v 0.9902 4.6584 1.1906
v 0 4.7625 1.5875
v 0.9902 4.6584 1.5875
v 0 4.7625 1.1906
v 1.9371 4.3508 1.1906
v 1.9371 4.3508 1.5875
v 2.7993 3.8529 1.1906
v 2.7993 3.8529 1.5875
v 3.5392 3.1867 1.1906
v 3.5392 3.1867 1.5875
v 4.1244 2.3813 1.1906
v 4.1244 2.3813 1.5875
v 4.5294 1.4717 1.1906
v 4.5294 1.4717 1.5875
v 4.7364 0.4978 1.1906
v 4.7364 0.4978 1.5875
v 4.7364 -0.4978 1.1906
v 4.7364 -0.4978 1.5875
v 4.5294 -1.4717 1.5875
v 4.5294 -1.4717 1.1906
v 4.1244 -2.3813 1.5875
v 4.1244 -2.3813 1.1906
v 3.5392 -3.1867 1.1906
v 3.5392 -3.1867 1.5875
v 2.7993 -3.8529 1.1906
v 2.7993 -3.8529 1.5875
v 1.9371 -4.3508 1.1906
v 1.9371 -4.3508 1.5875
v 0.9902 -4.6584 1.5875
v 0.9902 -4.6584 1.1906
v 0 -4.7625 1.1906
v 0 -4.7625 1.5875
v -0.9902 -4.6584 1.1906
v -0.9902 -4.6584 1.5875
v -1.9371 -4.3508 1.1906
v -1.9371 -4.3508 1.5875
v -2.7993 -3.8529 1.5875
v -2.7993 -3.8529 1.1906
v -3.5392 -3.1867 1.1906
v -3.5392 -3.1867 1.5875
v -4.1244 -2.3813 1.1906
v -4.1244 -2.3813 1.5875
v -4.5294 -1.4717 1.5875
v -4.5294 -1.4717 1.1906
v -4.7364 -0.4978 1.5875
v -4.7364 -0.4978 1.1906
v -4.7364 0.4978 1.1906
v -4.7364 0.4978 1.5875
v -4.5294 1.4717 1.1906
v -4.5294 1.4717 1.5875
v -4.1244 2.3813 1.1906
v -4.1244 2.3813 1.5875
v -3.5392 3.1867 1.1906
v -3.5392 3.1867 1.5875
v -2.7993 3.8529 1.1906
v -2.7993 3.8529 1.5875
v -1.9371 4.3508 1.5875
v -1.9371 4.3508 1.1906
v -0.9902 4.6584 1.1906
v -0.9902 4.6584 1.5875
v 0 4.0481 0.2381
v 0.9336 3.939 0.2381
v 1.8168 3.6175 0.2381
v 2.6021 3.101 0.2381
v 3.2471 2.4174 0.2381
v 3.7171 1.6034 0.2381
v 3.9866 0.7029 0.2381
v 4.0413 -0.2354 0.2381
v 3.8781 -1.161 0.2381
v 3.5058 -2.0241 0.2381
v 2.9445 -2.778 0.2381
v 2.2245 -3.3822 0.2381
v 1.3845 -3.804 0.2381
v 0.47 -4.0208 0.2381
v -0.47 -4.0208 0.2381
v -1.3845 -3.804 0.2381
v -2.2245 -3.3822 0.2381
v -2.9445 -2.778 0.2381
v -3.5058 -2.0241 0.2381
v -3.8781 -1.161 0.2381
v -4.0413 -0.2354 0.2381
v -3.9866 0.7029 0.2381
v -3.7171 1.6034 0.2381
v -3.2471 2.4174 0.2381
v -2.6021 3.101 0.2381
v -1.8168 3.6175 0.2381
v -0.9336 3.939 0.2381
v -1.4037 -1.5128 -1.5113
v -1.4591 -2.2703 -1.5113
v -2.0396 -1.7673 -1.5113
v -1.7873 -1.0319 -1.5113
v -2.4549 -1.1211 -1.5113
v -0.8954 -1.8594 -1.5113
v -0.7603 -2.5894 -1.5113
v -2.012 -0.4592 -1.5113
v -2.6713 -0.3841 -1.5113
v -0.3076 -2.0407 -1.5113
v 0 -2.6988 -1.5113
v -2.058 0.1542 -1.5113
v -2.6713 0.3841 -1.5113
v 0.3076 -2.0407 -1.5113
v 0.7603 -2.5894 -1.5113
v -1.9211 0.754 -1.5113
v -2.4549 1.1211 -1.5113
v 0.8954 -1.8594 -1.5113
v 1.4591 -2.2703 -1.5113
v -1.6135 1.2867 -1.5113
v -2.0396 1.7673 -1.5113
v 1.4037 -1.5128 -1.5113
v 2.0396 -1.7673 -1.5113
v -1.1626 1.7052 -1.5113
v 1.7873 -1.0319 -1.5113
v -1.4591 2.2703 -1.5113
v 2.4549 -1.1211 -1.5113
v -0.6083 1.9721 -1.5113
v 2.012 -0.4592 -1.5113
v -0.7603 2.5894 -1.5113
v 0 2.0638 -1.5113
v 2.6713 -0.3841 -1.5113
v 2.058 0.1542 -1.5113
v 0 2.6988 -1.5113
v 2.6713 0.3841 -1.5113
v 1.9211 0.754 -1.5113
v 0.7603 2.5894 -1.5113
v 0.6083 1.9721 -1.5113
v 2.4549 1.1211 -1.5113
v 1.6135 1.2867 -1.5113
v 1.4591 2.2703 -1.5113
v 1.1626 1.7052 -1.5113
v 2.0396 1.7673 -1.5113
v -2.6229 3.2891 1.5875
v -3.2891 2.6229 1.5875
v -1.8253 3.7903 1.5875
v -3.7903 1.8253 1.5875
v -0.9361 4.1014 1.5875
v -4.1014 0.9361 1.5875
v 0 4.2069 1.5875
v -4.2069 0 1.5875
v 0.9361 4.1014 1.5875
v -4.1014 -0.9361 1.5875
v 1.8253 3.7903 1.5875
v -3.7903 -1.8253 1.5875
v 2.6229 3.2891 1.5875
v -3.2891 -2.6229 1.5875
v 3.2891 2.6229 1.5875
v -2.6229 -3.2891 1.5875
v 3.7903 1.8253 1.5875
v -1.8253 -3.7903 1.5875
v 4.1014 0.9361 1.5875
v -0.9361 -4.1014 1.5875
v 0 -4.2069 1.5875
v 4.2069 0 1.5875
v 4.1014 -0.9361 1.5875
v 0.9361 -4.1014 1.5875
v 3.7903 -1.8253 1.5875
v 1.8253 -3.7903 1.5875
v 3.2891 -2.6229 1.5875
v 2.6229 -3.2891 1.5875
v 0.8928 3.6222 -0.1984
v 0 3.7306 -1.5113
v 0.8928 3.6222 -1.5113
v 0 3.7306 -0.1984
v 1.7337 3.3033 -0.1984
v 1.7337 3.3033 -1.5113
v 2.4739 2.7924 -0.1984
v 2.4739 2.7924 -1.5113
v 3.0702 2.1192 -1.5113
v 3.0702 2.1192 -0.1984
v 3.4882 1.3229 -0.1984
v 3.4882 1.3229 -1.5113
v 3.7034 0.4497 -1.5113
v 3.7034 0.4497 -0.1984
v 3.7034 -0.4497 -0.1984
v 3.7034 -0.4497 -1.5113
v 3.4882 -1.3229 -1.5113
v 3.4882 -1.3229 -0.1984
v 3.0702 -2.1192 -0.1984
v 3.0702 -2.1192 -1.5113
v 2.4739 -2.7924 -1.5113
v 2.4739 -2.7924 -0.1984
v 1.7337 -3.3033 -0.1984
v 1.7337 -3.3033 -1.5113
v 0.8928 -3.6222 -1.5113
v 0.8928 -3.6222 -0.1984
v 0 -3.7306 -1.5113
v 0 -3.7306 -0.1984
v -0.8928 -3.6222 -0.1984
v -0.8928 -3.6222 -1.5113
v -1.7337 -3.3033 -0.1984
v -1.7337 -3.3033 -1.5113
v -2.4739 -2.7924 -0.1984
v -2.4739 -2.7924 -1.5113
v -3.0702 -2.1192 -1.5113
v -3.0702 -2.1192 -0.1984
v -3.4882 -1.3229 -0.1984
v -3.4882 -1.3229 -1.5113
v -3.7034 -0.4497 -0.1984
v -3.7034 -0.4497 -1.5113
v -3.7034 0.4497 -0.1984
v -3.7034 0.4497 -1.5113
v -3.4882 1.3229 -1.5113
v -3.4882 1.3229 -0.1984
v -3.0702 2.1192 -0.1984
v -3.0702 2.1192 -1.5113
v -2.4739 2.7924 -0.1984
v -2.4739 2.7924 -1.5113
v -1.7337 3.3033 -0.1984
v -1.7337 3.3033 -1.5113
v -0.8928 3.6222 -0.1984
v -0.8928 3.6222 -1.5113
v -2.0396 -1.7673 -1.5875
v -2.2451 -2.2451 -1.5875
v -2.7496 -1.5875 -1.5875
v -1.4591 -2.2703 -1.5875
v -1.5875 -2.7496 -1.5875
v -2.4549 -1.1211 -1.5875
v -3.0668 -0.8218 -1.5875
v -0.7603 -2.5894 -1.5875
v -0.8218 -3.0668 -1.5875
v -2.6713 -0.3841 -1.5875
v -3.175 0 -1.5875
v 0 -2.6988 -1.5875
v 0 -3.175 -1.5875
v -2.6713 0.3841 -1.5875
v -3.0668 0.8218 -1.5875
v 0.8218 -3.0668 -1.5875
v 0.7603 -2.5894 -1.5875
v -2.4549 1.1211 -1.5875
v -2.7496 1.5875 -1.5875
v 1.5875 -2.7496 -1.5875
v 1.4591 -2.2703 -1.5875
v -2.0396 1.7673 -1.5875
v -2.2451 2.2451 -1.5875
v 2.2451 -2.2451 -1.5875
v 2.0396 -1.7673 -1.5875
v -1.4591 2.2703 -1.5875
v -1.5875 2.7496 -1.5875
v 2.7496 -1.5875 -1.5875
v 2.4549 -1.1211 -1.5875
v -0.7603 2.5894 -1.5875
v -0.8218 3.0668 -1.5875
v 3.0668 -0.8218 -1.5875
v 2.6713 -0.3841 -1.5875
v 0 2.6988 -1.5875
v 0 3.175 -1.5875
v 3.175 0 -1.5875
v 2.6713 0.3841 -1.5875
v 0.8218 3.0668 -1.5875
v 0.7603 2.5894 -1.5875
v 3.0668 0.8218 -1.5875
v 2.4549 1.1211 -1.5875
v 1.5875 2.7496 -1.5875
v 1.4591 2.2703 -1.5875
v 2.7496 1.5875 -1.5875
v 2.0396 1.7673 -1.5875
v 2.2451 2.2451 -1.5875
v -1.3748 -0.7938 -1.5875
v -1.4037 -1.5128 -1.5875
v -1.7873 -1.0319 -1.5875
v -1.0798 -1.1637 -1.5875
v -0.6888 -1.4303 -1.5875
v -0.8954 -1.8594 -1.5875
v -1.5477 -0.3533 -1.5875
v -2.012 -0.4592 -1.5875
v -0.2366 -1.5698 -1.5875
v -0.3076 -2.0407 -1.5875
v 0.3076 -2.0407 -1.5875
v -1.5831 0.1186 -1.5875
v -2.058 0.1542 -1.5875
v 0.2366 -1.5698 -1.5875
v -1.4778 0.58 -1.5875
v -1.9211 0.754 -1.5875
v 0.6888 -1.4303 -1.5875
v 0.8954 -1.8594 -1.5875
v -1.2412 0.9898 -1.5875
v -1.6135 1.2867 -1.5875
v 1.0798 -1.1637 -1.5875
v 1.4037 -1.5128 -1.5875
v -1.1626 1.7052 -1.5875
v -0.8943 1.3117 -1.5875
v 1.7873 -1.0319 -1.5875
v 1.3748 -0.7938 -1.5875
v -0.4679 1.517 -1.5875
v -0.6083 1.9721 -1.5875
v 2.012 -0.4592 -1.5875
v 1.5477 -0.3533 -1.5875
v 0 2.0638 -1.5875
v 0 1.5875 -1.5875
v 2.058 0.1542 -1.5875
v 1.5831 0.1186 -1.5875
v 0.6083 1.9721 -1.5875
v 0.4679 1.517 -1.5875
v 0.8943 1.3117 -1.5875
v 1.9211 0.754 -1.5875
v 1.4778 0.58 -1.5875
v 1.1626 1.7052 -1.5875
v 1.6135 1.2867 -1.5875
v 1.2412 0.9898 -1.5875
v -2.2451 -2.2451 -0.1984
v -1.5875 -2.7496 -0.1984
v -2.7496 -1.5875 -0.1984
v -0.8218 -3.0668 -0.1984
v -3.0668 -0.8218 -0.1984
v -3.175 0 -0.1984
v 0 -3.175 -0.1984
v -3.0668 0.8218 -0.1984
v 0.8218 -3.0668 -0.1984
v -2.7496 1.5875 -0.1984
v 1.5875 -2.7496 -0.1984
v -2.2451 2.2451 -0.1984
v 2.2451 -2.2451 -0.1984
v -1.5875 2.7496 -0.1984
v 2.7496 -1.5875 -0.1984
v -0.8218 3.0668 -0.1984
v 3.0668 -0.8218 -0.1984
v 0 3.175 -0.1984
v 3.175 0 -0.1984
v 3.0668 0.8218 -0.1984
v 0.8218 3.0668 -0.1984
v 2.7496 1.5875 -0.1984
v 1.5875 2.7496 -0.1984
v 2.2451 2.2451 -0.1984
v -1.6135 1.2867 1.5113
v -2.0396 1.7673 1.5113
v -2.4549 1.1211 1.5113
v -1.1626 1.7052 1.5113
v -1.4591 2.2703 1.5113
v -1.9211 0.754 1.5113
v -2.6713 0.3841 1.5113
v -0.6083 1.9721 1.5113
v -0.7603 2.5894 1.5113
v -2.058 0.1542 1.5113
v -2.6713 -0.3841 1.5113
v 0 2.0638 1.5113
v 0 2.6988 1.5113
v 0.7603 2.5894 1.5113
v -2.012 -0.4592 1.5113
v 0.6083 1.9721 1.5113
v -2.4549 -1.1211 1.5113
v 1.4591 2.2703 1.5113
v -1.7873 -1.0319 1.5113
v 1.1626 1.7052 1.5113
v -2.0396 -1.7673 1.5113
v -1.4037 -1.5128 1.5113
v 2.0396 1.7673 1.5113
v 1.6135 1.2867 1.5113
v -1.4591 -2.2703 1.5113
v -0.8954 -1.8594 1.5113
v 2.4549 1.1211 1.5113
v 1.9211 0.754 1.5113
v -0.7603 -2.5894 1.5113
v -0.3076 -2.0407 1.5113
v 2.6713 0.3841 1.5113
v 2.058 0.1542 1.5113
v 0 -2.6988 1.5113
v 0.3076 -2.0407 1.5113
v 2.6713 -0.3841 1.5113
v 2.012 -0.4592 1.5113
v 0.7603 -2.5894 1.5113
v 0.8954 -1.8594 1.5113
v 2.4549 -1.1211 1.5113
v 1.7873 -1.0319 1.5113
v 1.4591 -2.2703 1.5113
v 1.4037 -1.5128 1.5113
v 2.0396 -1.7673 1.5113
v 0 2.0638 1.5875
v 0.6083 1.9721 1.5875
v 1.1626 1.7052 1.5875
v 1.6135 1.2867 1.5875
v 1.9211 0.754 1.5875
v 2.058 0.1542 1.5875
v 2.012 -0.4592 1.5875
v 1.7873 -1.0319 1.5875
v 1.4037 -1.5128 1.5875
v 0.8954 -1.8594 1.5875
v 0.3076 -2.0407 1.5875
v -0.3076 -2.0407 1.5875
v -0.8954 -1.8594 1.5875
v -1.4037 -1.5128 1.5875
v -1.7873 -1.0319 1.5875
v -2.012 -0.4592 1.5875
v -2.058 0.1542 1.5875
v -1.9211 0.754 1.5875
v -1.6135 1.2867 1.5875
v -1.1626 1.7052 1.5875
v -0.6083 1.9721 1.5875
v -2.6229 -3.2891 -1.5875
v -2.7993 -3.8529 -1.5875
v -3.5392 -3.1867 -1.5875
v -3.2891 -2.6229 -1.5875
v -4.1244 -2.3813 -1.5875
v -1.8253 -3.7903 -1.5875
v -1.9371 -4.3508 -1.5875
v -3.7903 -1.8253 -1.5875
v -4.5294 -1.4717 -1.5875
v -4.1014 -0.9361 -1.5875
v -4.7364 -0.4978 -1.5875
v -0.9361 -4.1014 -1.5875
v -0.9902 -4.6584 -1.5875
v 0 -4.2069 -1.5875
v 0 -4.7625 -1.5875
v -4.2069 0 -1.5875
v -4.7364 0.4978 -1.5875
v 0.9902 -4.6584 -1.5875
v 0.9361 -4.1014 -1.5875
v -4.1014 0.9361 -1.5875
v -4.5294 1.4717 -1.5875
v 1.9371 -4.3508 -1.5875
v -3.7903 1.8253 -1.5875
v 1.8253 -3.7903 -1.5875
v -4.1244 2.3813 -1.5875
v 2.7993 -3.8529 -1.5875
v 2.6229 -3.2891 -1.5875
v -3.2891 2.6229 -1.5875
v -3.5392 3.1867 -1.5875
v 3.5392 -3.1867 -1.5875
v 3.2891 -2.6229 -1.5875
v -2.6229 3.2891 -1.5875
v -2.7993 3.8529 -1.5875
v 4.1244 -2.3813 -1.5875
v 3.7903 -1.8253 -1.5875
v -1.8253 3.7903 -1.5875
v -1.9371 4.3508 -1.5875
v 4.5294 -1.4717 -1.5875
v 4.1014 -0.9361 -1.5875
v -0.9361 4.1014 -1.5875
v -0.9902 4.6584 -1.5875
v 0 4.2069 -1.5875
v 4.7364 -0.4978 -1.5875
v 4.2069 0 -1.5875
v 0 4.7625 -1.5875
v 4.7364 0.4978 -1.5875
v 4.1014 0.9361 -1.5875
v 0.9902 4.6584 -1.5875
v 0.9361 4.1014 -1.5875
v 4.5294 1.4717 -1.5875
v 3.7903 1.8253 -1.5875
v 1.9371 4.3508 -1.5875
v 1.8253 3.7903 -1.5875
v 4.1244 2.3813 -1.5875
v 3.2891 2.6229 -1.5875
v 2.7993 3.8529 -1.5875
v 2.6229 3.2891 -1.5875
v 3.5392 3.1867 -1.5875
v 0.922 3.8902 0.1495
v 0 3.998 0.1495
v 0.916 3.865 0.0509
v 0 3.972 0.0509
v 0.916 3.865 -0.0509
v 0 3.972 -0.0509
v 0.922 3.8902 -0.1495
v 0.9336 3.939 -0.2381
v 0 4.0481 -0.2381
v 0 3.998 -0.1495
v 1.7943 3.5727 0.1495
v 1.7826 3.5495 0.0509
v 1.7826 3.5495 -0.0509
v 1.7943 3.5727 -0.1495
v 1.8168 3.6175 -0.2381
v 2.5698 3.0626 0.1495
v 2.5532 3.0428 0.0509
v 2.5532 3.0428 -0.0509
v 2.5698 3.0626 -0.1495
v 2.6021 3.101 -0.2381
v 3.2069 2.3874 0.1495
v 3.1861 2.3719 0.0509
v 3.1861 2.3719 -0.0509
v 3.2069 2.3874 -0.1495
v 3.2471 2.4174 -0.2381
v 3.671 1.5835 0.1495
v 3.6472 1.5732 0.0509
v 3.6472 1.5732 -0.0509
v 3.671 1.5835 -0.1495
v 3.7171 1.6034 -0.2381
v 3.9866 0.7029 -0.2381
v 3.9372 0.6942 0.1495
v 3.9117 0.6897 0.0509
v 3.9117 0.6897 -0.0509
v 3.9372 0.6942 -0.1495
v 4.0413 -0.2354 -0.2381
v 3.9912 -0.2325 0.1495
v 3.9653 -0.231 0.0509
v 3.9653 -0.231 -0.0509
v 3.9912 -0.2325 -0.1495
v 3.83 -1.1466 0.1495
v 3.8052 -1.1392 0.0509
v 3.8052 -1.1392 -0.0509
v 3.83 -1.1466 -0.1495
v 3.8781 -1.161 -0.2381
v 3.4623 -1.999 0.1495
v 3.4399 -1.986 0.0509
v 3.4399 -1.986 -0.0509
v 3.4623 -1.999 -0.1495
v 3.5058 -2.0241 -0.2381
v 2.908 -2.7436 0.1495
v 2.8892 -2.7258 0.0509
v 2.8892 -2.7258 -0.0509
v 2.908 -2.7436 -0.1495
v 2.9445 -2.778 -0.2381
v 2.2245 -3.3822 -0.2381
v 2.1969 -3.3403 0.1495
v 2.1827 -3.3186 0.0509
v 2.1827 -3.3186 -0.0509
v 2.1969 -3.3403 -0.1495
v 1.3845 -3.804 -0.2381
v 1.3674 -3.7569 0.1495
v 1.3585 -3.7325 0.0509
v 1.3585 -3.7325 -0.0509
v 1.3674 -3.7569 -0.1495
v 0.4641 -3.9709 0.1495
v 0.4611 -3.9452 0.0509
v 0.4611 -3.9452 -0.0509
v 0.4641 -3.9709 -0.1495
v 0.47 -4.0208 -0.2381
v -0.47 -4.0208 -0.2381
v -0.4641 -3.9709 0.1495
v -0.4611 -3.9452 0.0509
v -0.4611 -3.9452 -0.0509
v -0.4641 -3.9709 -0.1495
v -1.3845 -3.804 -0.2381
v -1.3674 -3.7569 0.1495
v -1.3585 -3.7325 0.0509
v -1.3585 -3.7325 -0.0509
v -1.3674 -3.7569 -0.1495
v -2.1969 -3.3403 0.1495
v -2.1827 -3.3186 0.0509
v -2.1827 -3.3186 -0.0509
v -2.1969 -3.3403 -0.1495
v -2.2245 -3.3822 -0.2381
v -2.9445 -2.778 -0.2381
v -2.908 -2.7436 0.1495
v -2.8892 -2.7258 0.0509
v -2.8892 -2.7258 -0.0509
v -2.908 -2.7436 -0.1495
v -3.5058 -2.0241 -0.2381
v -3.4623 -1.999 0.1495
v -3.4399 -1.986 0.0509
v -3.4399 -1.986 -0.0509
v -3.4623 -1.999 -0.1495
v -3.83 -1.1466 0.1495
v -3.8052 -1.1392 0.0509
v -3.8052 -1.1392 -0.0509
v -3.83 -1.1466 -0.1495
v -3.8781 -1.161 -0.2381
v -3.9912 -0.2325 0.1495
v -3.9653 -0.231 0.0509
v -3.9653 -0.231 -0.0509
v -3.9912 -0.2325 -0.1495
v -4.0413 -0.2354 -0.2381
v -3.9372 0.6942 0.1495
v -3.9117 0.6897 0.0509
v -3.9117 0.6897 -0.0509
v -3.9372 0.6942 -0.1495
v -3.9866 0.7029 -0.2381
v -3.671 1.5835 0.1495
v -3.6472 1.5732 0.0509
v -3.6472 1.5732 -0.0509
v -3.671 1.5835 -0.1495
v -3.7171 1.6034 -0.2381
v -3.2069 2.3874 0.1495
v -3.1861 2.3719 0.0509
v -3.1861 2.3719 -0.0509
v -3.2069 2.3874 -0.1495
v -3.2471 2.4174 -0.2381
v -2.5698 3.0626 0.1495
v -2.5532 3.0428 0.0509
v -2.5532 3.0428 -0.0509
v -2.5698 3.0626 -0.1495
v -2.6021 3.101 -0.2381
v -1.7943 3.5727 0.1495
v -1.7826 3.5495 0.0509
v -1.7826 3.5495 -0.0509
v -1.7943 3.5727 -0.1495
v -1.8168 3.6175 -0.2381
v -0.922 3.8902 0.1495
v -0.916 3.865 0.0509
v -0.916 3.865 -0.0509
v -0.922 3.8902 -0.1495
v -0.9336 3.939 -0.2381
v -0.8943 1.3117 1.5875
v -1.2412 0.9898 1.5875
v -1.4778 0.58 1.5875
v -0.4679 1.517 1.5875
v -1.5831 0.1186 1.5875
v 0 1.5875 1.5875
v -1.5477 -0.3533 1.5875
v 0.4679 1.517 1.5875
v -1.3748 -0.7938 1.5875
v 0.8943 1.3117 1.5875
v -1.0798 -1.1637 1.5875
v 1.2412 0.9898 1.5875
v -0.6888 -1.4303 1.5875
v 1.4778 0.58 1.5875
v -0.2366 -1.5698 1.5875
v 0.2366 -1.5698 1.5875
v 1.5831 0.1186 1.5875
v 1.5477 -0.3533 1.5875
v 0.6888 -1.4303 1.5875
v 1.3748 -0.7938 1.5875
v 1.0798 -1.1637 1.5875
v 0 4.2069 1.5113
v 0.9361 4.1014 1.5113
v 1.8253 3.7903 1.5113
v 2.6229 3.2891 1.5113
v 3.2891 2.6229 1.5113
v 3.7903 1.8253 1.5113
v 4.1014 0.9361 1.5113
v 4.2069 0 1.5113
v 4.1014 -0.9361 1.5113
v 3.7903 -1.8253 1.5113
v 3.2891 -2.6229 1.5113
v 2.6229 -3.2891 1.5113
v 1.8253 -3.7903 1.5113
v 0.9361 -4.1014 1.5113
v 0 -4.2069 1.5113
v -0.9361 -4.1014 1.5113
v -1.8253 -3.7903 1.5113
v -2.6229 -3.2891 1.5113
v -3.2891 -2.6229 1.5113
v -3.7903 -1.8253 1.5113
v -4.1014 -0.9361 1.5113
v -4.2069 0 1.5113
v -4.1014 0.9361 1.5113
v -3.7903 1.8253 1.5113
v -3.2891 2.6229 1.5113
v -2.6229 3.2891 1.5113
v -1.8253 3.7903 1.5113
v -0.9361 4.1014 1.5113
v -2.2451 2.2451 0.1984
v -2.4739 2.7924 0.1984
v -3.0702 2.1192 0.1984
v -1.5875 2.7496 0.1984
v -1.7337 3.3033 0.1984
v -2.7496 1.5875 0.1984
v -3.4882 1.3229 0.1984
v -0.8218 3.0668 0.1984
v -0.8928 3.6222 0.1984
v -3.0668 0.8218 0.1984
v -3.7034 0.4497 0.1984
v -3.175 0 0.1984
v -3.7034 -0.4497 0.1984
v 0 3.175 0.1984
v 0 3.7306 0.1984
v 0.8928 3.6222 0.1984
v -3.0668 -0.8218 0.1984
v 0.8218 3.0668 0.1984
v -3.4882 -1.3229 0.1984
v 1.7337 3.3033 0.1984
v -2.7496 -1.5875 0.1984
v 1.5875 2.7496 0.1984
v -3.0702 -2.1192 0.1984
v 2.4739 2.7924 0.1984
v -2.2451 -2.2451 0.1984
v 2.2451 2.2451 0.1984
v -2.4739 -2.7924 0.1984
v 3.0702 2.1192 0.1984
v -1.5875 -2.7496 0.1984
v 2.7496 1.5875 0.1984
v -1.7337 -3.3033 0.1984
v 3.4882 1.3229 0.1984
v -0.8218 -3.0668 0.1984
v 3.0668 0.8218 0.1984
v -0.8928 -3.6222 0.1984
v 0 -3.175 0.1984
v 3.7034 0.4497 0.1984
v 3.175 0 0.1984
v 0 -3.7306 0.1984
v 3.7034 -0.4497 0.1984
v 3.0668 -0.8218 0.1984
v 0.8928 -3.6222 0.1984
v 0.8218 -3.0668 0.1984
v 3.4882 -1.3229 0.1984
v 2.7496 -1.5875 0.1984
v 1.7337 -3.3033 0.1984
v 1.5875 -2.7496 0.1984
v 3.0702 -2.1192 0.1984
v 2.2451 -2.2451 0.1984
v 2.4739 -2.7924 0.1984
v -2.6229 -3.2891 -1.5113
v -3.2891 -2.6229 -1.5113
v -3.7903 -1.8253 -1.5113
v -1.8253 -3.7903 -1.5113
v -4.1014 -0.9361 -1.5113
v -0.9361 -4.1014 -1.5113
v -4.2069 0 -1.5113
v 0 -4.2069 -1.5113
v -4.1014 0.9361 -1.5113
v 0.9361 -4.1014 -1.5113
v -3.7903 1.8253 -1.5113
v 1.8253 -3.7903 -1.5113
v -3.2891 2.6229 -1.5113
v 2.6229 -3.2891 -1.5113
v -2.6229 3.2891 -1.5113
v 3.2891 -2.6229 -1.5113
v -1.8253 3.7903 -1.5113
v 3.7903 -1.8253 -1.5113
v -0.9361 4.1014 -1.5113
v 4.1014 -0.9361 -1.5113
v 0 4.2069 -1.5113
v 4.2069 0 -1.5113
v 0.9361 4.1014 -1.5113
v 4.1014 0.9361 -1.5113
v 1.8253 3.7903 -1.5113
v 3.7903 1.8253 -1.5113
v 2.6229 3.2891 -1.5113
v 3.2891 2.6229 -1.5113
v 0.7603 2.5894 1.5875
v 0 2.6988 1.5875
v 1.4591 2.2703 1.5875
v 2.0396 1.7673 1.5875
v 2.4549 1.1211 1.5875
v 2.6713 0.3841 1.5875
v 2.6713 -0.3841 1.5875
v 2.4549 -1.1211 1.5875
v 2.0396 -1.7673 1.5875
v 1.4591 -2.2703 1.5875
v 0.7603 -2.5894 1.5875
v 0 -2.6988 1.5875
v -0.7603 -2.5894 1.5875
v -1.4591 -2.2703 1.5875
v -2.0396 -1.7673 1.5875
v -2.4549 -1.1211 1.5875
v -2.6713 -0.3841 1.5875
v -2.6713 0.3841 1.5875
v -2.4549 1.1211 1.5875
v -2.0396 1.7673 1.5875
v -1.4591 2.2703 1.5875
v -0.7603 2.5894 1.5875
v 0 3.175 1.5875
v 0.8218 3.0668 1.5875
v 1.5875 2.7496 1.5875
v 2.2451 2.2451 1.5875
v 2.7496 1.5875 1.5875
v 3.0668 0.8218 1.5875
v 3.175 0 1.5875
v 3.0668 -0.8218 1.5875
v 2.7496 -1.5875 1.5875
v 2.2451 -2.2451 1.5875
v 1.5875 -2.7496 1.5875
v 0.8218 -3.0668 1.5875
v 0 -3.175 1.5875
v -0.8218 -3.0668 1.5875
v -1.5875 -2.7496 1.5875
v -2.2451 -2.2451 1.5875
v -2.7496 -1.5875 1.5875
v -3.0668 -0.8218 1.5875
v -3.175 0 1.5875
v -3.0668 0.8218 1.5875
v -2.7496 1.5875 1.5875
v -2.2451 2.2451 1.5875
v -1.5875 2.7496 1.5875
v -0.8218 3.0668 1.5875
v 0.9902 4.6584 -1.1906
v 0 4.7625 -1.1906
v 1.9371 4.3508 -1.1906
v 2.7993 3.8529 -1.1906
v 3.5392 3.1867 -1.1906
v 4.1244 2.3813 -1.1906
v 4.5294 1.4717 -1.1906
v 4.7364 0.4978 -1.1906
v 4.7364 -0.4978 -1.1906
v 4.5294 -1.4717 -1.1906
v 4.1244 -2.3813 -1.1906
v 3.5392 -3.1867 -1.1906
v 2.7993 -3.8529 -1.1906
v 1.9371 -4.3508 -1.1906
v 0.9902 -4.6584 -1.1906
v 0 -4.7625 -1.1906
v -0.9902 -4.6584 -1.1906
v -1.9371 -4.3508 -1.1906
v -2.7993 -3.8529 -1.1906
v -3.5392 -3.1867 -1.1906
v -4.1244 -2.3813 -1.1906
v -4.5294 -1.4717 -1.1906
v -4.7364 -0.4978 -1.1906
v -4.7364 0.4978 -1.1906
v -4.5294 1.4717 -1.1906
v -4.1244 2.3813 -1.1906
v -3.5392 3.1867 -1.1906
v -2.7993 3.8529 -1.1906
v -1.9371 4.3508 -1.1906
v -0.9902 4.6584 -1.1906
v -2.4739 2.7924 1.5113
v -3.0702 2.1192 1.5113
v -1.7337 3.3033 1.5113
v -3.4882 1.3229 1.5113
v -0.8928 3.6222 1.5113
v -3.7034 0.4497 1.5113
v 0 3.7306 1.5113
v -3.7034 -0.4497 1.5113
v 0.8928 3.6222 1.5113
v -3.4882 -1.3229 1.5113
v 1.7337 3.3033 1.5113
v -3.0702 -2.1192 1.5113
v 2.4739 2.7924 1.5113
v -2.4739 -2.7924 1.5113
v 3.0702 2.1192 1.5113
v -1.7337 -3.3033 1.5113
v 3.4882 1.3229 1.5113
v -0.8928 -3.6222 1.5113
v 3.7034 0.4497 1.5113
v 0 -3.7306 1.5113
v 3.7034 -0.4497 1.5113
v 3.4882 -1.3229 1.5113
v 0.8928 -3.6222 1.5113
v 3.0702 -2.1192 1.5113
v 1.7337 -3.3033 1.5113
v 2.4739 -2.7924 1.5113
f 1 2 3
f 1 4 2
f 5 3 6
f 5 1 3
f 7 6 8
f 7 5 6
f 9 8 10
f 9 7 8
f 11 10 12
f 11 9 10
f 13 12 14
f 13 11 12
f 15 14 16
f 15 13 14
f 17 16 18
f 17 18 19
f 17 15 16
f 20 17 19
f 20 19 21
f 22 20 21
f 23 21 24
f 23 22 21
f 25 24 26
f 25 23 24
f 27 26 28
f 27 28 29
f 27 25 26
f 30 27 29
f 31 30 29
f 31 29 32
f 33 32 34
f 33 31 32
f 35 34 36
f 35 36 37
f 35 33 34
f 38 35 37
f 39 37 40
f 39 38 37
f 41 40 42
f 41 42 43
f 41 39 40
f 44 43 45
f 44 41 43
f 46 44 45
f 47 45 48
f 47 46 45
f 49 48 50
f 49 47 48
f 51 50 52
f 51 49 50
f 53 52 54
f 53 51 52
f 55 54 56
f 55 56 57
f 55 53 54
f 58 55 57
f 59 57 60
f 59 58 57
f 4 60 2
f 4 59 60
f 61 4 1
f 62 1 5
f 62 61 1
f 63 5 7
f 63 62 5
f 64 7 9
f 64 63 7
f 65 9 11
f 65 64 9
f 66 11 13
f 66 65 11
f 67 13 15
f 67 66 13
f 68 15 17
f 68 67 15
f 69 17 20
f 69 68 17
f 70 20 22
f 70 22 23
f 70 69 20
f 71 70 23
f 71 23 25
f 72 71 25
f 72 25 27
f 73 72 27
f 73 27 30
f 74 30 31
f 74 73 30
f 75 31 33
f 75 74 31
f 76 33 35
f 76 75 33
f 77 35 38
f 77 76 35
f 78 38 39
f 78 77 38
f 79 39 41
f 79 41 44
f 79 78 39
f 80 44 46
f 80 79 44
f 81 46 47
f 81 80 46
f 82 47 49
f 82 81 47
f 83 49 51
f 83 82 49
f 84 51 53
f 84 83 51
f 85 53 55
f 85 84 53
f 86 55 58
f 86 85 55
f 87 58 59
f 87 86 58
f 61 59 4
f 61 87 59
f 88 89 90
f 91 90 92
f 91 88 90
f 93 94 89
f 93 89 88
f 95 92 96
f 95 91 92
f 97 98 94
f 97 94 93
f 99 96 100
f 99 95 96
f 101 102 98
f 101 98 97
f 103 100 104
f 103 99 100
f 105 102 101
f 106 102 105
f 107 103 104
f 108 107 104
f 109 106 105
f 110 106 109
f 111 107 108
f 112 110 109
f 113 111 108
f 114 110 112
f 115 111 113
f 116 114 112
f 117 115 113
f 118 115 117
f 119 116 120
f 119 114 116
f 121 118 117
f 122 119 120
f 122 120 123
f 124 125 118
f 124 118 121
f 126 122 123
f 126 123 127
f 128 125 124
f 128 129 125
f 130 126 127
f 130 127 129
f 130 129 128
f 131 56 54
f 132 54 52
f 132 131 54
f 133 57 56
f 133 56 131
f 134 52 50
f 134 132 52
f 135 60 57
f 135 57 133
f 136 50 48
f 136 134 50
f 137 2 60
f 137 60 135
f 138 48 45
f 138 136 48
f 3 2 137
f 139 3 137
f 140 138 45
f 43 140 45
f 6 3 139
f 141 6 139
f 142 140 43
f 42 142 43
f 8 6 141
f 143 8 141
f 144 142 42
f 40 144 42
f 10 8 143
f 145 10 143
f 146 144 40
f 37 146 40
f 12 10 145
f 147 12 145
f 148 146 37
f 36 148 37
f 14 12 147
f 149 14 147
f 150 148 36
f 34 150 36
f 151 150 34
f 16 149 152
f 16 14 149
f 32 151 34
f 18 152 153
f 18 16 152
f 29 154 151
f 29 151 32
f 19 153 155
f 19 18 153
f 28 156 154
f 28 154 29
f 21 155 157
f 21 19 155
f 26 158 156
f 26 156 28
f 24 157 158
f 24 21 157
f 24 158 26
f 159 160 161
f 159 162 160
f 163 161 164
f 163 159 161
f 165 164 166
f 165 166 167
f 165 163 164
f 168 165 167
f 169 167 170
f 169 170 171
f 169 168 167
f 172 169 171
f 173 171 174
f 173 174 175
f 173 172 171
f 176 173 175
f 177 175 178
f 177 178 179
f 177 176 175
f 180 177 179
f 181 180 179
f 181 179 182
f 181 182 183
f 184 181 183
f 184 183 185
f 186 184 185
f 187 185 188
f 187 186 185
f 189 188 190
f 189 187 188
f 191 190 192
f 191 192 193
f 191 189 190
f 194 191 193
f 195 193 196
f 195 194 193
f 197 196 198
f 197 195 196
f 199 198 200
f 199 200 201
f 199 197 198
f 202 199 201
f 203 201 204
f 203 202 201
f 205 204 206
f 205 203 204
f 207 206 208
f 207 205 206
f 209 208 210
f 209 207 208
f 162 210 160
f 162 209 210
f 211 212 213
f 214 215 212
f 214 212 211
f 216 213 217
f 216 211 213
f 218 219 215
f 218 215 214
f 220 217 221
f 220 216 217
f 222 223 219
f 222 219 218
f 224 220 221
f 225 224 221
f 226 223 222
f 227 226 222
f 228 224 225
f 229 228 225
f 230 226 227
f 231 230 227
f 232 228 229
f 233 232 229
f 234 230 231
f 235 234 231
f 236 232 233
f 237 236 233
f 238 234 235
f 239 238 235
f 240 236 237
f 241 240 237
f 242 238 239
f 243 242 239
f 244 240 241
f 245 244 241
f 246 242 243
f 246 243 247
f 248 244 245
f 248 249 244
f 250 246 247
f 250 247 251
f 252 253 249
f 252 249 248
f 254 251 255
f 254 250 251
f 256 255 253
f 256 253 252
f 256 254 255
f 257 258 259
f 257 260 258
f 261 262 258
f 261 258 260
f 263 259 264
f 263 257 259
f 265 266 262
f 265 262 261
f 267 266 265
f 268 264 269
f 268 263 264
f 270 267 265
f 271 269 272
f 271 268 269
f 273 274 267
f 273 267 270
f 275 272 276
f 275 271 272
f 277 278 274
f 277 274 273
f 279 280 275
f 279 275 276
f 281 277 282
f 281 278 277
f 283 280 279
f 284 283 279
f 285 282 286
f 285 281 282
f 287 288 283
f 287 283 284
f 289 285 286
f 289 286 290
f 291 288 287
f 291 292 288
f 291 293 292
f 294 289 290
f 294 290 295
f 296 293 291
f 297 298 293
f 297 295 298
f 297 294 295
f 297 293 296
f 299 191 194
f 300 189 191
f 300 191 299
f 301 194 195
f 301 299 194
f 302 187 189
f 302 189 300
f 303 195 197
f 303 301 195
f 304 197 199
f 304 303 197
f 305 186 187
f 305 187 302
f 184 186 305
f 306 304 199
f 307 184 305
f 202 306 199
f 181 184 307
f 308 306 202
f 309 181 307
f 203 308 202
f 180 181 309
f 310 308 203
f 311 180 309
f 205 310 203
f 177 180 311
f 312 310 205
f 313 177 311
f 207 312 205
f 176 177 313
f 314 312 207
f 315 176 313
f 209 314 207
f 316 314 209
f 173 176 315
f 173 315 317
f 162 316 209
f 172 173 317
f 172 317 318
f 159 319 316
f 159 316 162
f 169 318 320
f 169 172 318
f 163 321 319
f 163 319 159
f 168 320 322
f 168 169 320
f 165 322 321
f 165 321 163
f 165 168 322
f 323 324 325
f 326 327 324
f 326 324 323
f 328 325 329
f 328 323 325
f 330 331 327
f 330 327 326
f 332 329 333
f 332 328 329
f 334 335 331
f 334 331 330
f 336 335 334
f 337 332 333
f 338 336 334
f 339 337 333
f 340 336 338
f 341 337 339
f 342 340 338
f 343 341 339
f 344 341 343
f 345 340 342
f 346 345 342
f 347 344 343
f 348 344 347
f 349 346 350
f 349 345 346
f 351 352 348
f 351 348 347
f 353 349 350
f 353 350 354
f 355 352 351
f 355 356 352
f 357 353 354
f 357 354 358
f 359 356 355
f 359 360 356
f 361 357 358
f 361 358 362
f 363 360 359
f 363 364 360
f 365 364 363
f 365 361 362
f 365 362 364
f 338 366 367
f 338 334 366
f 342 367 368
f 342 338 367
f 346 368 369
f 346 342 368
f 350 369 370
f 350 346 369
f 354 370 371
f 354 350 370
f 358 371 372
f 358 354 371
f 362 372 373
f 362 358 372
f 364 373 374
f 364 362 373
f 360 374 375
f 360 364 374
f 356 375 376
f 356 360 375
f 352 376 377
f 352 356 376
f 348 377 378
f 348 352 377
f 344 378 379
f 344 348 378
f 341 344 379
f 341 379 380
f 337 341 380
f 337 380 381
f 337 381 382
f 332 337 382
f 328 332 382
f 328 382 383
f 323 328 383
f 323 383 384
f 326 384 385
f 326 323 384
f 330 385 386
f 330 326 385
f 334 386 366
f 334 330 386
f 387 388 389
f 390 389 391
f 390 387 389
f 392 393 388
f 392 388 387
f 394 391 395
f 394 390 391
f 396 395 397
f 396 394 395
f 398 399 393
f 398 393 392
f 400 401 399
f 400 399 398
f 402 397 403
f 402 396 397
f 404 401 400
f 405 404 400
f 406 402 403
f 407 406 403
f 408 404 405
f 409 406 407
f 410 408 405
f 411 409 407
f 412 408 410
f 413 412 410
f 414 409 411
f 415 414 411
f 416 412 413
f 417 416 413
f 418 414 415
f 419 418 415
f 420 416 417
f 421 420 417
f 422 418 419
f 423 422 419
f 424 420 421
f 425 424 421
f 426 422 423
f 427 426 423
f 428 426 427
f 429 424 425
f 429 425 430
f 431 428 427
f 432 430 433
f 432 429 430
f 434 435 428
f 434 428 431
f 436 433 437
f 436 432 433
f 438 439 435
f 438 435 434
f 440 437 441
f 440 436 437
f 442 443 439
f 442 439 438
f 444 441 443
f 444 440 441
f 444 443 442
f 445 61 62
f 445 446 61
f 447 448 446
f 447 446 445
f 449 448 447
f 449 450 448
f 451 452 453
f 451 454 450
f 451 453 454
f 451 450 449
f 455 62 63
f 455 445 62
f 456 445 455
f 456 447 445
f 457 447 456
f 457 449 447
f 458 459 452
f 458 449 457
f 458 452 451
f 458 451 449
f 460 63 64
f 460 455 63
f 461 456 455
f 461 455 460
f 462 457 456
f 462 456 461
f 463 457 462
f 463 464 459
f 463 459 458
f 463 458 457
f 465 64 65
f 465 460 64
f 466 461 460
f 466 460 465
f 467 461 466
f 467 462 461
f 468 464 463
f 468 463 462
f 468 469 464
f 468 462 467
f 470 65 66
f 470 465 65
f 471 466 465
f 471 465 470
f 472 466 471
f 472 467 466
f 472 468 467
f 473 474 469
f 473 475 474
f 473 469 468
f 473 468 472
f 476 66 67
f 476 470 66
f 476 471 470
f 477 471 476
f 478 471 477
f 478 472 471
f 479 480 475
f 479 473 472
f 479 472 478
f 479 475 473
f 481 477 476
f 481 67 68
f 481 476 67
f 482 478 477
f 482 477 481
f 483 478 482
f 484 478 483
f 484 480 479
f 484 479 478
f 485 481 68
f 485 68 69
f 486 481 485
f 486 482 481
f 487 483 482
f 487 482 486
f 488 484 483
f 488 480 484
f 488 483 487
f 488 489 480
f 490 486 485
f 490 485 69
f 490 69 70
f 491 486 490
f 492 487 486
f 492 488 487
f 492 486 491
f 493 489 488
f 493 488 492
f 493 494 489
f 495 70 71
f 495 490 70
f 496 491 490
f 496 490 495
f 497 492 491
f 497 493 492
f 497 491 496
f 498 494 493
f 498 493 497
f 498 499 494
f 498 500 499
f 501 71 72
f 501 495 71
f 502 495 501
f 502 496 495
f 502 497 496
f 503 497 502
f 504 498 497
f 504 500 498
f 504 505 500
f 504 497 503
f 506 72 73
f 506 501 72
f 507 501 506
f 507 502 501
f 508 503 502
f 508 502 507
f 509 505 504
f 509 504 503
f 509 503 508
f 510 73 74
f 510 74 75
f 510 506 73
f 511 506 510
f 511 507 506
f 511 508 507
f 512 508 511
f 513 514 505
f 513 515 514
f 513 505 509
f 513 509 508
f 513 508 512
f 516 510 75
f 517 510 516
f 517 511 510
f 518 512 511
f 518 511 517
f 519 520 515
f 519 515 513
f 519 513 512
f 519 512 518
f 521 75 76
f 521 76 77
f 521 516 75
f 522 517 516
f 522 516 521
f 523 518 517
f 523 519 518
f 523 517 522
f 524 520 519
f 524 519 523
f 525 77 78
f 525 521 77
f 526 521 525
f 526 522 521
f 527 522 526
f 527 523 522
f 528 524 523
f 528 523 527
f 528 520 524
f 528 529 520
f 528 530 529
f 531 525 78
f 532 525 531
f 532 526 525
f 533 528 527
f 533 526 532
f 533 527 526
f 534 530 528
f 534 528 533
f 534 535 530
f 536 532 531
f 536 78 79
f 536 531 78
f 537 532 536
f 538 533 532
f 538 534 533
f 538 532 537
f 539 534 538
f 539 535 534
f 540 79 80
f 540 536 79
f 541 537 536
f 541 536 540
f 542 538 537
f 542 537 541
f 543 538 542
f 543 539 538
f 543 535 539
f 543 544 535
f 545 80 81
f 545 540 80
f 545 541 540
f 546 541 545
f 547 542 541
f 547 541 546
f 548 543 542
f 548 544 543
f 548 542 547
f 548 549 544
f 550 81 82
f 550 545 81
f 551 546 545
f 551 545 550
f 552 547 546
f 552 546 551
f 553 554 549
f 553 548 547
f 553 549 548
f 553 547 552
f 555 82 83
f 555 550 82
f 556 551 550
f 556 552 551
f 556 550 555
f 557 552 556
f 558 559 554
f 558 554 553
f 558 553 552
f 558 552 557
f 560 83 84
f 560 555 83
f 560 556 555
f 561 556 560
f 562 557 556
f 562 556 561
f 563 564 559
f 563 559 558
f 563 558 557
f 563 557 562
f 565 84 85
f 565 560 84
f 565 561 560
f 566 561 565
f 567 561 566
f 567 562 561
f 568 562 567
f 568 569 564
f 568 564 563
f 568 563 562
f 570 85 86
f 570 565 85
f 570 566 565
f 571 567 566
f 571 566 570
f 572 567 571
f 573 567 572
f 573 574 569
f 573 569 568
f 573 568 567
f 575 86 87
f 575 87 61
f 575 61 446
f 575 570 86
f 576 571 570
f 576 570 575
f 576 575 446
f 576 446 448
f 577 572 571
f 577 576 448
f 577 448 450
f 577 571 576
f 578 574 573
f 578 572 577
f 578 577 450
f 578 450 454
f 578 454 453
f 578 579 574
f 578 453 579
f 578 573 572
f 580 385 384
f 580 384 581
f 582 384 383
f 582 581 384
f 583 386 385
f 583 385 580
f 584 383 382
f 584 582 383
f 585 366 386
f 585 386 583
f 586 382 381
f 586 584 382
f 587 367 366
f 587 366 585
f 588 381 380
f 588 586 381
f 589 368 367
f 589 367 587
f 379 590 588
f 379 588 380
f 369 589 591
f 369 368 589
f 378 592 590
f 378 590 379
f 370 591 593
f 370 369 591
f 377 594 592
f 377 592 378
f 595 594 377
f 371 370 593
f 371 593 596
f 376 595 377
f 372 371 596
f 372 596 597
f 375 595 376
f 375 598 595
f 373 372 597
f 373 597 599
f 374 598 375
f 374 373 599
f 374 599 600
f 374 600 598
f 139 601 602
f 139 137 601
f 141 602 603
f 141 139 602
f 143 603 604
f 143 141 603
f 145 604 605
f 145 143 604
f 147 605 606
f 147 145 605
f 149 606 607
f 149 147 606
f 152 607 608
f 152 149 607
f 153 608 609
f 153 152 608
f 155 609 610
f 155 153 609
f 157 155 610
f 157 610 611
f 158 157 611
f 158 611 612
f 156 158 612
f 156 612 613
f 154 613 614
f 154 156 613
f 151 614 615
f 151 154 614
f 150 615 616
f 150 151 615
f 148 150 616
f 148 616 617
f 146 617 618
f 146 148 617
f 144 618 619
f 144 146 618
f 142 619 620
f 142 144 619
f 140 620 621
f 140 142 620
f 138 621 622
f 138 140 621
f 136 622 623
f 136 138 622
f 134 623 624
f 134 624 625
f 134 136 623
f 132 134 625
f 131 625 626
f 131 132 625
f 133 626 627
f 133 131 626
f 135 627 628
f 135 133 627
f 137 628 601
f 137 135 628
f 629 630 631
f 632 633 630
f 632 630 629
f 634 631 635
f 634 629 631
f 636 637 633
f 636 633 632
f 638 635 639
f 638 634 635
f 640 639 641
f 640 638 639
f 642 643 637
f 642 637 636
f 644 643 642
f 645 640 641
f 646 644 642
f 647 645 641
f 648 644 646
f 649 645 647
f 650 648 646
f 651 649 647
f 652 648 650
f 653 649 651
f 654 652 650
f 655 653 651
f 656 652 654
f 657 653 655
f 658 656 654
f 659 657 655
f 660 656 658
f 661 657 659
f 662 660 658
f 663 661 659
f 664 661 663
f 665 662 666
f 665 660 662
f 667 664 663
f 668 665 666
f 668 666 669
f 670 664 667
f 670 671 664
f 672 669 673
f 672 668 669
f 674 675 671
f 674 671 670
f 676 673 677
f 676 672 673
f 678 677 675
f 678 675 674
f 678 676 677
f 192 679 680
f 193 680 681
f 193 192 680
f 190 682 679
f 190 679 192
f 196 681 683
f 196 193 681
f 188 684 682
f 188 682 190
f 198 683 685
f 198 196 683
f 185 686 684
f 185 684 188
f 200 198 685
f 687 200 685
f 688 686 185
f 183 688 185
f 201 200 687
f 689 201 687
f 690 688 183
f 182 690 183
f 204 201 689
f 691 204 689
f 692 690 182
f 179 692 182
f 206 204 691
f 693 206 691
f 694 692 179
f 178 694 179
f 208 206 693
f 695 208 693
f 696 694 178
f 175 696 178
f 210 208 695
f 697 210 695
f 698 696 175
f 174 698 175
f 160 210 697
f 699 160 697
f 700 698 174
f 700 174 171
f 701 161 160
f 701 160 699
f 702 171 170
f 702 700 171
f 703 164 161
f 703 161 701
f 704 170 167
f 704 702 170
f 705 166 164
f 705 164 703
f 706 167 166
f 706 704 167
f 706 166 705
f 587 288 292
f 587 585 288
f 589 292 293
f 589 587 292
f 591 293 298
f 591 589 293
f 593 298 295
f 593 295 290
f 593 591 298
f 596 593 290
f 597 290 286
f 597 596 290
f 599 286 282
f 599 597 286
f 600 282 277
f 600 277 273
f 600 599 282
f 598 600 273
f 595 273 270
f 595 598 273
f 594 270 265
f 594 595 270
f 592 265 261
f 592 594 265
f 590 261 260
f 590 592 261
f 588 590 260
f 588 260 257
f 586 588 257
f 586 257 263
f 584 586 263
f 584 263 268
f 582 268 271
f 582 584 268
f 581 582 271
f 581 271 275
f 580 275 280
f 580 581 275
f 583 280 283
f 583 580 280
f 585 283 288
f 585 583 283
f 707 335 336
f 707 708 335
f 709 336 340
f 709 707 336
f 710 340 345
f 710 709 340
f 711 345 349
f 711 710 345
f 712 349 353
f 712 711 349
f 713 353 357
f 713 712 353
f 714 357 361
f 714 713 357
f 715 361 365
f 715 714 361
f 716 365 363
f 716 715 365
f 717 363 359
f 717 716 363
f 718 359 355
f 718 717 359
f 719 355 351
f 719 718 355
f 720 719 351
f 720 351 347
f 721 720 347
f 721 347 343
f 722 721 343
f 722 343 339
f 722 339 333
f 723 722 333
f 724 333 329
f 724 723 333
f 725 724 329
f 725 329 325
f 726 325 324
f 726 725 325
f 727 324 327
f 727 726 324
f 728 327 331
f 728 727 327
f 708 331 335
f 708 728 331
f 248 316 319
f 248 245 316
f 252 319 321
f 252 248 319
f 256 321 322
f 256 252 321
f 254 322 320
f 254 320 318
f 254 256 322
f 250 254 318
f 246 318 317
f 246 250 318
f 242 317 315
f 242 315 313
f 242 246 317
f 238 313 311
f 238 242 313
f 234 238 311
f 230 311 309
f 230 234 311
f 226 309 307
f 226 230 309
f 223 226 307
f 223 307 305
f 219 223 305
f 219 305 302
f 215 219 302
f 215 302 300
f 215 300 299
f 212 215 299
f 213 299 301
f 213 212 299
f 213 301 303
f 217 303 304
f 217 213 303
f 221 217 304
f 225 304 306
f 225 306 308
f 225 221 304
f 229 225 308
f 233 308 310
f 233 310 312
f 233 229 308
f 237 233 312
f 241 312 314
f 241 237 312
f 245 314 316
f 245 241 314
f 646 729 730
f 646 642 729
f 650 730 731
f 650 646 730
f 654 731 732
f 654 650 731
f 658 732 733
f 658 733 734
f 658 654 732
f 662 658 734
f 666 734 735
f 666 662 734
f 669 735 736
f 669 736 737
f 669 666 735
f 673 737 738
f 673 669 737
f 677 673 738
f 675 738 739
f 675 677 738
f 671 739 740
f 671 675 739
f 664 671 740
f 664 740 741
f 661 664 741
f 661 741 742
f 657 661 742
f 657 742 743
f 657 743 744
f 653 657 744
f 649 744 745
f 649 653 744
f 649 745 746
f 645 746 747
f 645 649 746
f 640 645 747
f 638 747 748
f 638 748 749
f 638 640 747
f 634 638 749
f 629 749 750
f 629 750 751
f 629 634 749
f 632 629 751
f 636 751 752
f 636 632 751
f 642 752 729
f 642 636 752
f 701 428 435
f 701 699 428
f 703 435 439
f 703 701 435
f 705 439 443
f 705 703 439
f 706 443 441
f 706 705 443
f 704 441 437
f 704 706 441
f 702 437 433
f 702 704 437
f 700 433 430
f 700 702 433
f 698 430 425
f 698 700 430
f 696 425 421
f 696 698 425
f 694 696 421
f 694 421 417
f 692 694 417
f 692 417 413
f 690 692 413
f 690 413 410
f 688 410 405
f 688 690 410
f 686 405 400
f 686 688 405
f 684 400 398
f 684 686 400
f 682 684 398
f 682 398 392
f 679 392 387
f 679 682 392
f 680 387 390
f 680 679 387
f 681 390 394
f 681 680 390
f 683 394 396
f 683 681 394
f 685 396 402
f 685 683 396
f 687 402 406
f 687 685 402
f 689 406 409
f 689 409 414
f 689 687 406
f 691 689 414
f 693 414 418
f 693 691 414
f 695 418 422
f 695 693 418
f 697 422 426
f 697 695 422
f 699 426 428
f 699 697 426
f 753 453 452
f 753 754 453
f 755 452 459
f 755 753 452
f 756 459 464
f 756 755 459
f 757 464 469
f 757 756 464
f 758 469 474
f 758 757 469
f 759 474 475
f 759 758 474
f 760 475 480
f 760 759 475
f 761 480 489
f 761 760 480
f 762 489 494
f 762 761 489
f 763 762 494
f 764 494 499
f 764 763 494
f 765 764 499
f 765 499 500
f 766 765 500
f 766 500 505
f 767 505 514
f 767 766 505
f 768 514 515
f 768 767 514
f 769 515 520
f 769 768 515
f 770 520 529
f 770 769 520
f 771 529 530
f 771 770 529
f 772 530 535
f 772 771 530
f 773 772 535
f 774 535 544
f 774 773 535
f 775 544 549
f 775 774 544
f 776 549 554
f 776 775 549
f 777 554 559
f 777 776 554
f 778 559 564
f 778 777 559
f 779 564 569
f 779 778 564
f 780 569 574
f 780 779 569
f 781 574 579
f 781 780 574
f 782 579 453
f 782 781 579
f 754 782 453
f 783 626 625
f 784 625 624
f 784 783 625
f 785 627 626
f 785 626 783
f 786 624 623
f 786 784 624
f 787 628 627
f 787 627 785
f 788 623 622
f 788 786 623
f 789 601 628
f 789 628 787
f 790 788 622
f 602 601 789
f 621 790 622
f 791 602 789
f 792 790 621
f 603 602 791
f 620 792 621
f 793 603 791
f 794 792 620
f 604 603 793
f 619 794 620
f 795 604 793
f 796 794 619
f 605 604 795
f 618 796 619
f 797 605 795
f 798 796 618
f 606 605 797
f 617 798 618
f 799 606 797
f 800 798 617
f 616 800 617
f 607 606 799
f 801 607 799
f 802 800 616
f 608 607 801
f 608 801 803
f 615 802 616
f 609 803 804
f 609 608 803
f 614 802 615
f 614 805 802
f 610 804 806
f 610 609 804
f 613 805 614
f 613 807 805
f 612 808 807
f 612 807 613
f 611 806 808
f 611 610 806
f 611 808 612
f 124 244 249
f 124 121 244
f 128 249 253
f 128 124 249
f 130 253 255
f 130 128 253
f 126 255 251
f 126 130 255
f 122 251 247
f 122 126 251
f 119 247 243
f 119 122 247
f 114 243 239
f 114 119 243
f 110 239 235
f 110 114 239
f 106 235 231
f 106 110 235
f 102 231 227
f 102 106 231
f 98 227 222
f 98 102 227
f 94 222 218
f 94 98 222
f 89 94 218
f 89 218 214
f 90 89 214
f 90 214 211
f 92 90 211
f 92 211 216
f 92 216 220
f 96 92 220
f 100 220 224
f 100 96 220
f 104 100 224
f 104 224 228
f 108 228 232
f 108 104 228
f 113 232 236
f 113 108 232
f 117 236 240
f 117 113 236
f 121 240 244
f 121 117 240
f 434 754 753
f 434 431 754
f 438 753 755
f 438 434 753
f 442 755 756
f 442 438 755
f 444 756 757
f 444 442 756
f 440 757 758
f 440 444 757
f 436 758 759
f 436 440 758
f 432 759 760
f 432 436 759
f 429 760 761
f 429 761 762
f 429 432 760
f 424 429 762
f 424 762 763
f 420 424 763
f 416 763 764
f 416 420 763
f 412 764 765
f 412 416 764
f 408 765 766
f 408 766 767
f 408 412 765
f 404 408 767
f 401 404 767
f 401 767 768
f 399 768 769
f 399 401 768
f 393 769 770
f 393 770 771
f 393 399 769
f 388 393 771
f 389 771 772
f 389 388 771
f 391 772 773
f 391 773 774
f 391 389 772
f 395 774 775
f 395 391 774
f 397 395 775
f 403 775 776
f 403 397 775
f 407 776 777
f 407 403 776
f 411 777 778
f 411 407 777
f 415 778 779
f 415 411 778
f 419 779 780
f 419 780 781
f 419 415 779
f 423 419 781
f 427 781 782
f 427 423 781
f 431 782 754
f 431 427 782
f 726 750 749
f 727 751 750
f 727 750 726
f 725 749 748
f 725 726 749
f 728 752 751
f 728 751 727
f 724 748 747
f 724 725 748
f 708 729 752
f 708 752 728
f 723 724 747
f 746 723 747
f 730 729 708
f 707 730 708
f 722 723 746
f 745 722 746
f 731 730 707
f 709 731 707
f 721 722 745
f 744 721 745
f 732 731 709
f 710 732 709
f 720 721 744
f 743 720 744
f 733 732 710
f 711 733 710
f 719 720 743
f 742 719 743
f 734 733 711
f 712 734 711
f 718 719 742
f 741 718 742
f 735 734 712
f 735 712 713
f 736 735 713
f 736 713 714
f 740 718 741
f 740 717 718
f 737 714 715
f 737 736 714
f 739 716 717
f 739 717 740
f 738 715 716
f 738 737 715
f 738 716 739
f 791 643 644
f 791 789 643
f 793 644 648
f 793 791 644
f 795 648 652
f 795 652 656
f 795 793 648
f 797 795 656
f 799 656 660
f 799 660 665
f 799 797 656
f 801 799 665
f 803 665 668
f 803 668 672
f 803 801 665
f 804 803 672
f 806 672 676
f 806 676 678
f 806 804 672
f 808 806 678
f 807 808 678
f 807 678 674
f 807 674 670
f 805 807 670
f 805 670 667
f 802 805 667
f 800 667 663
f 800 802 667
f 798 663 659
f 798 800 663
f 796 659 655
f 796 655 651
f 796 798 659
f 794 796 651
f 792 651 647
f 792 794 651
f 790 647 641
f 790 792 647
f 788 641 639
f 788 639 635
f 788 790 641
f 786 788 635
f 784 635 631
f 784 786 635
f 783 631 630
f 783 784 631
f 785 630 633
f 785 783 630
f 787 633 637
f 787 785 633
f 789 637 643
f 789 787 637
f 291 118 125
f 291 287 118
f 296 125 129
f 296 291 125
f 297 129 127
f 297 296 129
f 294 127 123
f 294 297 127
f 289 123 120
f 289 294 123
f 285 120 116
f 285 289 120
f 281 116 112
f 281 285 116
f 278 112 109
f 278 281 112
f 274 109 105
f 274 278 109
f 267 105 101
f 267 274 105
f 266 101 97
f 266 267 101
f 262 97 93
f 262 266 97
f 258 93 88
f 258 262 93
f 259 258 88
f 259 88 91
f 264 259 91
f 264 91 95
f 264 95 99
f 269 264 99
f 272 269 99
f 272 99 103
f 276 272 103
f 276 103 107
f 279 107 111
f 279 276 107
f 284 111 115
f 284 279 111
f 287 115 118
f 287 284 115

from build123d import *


with BuildPart() as part:
    # Sketch1 → Revolve1 (revolve)
    with BuildSketch(Plane(origin=(0, 0, 0), x_dir=(0, 0, -1), z_dir=(1, 0, 0))):
        with BuildLine():
            Line((1.190625, 4.7625), (1.5875, 4.7625))
            Line((1.5875, 4.7625), (1.5875, 4.206875))
            Line((1.5875, 4.206875), (1.5113, 4.206875))
            Line((1.5113, 4.206875), (1.5113, 3.730625))
            Line((1.5113, 3.730625), (0.1984375, 3.730625))
            Line((0.1984375, 3.730625), (0.1984375, 3.175))
            Line((0.1984375, 3.175), (1.5875, 3.175))
            Line((1.5875, 3.175), (1.5875, 2.69875))
            Line((1.5875, 2.69875), (1.5113, 2.69875))
            Line((1.5113, 2.69875), (1.5113, 2.06375))
            Line((1.5113, 2.06375), (1.5875, 2.06375))
            Line((1.5875, 2.06375), (1.5875, 1.5875))
            Line((1.5875, 1.5875), (-1.5875, 1.5875))
            Line((-1.5875, 1.5875), (-1.5875, 2.06375))
            Line((-1.5875, 2.06375), (-1.5113, 2.06375))
            Line((-1.5113, 2.06375), (-1.5113, 2.69875))
            Line((-1.5113, 2.69875), (-1.5875, 2.69875))
            Line((-1.5875, 2.69875), (-1.5875, 3.175))
            Line((-1.5875, 3.175), (-0.1984375, 3.175))
            Line((-0.1984375, 3.175), (-0.1984375, 3.730625))
            Line((-0.1984375, 3.730625), (-1.5113, 3.730625))
            Line((-1.5113, 3.730625), (-1.5113, 4.206875))
            Line((-1.5113, 4.206875), (-1.5875, 4.206875))
            Line((-1.5875, 4.206875), (-1.5875, 4.7625))
            Line((-1.5875, 4.7625), (-1.190625, 4.7625))
            Line((-1.190625, 4.7625), (-0.238125, 4.048125))
            ThreePointArc((-0.238125, 4.048125), (0, 3.96875), (0.238125, 4.048125))
            Line((0.238125, 4.048125), (1.190625, 4.7625))
        make_face()
    revolve(axis=Axis((0, 0, 1.5875), (0, 0, -1)))


solid = part.part
